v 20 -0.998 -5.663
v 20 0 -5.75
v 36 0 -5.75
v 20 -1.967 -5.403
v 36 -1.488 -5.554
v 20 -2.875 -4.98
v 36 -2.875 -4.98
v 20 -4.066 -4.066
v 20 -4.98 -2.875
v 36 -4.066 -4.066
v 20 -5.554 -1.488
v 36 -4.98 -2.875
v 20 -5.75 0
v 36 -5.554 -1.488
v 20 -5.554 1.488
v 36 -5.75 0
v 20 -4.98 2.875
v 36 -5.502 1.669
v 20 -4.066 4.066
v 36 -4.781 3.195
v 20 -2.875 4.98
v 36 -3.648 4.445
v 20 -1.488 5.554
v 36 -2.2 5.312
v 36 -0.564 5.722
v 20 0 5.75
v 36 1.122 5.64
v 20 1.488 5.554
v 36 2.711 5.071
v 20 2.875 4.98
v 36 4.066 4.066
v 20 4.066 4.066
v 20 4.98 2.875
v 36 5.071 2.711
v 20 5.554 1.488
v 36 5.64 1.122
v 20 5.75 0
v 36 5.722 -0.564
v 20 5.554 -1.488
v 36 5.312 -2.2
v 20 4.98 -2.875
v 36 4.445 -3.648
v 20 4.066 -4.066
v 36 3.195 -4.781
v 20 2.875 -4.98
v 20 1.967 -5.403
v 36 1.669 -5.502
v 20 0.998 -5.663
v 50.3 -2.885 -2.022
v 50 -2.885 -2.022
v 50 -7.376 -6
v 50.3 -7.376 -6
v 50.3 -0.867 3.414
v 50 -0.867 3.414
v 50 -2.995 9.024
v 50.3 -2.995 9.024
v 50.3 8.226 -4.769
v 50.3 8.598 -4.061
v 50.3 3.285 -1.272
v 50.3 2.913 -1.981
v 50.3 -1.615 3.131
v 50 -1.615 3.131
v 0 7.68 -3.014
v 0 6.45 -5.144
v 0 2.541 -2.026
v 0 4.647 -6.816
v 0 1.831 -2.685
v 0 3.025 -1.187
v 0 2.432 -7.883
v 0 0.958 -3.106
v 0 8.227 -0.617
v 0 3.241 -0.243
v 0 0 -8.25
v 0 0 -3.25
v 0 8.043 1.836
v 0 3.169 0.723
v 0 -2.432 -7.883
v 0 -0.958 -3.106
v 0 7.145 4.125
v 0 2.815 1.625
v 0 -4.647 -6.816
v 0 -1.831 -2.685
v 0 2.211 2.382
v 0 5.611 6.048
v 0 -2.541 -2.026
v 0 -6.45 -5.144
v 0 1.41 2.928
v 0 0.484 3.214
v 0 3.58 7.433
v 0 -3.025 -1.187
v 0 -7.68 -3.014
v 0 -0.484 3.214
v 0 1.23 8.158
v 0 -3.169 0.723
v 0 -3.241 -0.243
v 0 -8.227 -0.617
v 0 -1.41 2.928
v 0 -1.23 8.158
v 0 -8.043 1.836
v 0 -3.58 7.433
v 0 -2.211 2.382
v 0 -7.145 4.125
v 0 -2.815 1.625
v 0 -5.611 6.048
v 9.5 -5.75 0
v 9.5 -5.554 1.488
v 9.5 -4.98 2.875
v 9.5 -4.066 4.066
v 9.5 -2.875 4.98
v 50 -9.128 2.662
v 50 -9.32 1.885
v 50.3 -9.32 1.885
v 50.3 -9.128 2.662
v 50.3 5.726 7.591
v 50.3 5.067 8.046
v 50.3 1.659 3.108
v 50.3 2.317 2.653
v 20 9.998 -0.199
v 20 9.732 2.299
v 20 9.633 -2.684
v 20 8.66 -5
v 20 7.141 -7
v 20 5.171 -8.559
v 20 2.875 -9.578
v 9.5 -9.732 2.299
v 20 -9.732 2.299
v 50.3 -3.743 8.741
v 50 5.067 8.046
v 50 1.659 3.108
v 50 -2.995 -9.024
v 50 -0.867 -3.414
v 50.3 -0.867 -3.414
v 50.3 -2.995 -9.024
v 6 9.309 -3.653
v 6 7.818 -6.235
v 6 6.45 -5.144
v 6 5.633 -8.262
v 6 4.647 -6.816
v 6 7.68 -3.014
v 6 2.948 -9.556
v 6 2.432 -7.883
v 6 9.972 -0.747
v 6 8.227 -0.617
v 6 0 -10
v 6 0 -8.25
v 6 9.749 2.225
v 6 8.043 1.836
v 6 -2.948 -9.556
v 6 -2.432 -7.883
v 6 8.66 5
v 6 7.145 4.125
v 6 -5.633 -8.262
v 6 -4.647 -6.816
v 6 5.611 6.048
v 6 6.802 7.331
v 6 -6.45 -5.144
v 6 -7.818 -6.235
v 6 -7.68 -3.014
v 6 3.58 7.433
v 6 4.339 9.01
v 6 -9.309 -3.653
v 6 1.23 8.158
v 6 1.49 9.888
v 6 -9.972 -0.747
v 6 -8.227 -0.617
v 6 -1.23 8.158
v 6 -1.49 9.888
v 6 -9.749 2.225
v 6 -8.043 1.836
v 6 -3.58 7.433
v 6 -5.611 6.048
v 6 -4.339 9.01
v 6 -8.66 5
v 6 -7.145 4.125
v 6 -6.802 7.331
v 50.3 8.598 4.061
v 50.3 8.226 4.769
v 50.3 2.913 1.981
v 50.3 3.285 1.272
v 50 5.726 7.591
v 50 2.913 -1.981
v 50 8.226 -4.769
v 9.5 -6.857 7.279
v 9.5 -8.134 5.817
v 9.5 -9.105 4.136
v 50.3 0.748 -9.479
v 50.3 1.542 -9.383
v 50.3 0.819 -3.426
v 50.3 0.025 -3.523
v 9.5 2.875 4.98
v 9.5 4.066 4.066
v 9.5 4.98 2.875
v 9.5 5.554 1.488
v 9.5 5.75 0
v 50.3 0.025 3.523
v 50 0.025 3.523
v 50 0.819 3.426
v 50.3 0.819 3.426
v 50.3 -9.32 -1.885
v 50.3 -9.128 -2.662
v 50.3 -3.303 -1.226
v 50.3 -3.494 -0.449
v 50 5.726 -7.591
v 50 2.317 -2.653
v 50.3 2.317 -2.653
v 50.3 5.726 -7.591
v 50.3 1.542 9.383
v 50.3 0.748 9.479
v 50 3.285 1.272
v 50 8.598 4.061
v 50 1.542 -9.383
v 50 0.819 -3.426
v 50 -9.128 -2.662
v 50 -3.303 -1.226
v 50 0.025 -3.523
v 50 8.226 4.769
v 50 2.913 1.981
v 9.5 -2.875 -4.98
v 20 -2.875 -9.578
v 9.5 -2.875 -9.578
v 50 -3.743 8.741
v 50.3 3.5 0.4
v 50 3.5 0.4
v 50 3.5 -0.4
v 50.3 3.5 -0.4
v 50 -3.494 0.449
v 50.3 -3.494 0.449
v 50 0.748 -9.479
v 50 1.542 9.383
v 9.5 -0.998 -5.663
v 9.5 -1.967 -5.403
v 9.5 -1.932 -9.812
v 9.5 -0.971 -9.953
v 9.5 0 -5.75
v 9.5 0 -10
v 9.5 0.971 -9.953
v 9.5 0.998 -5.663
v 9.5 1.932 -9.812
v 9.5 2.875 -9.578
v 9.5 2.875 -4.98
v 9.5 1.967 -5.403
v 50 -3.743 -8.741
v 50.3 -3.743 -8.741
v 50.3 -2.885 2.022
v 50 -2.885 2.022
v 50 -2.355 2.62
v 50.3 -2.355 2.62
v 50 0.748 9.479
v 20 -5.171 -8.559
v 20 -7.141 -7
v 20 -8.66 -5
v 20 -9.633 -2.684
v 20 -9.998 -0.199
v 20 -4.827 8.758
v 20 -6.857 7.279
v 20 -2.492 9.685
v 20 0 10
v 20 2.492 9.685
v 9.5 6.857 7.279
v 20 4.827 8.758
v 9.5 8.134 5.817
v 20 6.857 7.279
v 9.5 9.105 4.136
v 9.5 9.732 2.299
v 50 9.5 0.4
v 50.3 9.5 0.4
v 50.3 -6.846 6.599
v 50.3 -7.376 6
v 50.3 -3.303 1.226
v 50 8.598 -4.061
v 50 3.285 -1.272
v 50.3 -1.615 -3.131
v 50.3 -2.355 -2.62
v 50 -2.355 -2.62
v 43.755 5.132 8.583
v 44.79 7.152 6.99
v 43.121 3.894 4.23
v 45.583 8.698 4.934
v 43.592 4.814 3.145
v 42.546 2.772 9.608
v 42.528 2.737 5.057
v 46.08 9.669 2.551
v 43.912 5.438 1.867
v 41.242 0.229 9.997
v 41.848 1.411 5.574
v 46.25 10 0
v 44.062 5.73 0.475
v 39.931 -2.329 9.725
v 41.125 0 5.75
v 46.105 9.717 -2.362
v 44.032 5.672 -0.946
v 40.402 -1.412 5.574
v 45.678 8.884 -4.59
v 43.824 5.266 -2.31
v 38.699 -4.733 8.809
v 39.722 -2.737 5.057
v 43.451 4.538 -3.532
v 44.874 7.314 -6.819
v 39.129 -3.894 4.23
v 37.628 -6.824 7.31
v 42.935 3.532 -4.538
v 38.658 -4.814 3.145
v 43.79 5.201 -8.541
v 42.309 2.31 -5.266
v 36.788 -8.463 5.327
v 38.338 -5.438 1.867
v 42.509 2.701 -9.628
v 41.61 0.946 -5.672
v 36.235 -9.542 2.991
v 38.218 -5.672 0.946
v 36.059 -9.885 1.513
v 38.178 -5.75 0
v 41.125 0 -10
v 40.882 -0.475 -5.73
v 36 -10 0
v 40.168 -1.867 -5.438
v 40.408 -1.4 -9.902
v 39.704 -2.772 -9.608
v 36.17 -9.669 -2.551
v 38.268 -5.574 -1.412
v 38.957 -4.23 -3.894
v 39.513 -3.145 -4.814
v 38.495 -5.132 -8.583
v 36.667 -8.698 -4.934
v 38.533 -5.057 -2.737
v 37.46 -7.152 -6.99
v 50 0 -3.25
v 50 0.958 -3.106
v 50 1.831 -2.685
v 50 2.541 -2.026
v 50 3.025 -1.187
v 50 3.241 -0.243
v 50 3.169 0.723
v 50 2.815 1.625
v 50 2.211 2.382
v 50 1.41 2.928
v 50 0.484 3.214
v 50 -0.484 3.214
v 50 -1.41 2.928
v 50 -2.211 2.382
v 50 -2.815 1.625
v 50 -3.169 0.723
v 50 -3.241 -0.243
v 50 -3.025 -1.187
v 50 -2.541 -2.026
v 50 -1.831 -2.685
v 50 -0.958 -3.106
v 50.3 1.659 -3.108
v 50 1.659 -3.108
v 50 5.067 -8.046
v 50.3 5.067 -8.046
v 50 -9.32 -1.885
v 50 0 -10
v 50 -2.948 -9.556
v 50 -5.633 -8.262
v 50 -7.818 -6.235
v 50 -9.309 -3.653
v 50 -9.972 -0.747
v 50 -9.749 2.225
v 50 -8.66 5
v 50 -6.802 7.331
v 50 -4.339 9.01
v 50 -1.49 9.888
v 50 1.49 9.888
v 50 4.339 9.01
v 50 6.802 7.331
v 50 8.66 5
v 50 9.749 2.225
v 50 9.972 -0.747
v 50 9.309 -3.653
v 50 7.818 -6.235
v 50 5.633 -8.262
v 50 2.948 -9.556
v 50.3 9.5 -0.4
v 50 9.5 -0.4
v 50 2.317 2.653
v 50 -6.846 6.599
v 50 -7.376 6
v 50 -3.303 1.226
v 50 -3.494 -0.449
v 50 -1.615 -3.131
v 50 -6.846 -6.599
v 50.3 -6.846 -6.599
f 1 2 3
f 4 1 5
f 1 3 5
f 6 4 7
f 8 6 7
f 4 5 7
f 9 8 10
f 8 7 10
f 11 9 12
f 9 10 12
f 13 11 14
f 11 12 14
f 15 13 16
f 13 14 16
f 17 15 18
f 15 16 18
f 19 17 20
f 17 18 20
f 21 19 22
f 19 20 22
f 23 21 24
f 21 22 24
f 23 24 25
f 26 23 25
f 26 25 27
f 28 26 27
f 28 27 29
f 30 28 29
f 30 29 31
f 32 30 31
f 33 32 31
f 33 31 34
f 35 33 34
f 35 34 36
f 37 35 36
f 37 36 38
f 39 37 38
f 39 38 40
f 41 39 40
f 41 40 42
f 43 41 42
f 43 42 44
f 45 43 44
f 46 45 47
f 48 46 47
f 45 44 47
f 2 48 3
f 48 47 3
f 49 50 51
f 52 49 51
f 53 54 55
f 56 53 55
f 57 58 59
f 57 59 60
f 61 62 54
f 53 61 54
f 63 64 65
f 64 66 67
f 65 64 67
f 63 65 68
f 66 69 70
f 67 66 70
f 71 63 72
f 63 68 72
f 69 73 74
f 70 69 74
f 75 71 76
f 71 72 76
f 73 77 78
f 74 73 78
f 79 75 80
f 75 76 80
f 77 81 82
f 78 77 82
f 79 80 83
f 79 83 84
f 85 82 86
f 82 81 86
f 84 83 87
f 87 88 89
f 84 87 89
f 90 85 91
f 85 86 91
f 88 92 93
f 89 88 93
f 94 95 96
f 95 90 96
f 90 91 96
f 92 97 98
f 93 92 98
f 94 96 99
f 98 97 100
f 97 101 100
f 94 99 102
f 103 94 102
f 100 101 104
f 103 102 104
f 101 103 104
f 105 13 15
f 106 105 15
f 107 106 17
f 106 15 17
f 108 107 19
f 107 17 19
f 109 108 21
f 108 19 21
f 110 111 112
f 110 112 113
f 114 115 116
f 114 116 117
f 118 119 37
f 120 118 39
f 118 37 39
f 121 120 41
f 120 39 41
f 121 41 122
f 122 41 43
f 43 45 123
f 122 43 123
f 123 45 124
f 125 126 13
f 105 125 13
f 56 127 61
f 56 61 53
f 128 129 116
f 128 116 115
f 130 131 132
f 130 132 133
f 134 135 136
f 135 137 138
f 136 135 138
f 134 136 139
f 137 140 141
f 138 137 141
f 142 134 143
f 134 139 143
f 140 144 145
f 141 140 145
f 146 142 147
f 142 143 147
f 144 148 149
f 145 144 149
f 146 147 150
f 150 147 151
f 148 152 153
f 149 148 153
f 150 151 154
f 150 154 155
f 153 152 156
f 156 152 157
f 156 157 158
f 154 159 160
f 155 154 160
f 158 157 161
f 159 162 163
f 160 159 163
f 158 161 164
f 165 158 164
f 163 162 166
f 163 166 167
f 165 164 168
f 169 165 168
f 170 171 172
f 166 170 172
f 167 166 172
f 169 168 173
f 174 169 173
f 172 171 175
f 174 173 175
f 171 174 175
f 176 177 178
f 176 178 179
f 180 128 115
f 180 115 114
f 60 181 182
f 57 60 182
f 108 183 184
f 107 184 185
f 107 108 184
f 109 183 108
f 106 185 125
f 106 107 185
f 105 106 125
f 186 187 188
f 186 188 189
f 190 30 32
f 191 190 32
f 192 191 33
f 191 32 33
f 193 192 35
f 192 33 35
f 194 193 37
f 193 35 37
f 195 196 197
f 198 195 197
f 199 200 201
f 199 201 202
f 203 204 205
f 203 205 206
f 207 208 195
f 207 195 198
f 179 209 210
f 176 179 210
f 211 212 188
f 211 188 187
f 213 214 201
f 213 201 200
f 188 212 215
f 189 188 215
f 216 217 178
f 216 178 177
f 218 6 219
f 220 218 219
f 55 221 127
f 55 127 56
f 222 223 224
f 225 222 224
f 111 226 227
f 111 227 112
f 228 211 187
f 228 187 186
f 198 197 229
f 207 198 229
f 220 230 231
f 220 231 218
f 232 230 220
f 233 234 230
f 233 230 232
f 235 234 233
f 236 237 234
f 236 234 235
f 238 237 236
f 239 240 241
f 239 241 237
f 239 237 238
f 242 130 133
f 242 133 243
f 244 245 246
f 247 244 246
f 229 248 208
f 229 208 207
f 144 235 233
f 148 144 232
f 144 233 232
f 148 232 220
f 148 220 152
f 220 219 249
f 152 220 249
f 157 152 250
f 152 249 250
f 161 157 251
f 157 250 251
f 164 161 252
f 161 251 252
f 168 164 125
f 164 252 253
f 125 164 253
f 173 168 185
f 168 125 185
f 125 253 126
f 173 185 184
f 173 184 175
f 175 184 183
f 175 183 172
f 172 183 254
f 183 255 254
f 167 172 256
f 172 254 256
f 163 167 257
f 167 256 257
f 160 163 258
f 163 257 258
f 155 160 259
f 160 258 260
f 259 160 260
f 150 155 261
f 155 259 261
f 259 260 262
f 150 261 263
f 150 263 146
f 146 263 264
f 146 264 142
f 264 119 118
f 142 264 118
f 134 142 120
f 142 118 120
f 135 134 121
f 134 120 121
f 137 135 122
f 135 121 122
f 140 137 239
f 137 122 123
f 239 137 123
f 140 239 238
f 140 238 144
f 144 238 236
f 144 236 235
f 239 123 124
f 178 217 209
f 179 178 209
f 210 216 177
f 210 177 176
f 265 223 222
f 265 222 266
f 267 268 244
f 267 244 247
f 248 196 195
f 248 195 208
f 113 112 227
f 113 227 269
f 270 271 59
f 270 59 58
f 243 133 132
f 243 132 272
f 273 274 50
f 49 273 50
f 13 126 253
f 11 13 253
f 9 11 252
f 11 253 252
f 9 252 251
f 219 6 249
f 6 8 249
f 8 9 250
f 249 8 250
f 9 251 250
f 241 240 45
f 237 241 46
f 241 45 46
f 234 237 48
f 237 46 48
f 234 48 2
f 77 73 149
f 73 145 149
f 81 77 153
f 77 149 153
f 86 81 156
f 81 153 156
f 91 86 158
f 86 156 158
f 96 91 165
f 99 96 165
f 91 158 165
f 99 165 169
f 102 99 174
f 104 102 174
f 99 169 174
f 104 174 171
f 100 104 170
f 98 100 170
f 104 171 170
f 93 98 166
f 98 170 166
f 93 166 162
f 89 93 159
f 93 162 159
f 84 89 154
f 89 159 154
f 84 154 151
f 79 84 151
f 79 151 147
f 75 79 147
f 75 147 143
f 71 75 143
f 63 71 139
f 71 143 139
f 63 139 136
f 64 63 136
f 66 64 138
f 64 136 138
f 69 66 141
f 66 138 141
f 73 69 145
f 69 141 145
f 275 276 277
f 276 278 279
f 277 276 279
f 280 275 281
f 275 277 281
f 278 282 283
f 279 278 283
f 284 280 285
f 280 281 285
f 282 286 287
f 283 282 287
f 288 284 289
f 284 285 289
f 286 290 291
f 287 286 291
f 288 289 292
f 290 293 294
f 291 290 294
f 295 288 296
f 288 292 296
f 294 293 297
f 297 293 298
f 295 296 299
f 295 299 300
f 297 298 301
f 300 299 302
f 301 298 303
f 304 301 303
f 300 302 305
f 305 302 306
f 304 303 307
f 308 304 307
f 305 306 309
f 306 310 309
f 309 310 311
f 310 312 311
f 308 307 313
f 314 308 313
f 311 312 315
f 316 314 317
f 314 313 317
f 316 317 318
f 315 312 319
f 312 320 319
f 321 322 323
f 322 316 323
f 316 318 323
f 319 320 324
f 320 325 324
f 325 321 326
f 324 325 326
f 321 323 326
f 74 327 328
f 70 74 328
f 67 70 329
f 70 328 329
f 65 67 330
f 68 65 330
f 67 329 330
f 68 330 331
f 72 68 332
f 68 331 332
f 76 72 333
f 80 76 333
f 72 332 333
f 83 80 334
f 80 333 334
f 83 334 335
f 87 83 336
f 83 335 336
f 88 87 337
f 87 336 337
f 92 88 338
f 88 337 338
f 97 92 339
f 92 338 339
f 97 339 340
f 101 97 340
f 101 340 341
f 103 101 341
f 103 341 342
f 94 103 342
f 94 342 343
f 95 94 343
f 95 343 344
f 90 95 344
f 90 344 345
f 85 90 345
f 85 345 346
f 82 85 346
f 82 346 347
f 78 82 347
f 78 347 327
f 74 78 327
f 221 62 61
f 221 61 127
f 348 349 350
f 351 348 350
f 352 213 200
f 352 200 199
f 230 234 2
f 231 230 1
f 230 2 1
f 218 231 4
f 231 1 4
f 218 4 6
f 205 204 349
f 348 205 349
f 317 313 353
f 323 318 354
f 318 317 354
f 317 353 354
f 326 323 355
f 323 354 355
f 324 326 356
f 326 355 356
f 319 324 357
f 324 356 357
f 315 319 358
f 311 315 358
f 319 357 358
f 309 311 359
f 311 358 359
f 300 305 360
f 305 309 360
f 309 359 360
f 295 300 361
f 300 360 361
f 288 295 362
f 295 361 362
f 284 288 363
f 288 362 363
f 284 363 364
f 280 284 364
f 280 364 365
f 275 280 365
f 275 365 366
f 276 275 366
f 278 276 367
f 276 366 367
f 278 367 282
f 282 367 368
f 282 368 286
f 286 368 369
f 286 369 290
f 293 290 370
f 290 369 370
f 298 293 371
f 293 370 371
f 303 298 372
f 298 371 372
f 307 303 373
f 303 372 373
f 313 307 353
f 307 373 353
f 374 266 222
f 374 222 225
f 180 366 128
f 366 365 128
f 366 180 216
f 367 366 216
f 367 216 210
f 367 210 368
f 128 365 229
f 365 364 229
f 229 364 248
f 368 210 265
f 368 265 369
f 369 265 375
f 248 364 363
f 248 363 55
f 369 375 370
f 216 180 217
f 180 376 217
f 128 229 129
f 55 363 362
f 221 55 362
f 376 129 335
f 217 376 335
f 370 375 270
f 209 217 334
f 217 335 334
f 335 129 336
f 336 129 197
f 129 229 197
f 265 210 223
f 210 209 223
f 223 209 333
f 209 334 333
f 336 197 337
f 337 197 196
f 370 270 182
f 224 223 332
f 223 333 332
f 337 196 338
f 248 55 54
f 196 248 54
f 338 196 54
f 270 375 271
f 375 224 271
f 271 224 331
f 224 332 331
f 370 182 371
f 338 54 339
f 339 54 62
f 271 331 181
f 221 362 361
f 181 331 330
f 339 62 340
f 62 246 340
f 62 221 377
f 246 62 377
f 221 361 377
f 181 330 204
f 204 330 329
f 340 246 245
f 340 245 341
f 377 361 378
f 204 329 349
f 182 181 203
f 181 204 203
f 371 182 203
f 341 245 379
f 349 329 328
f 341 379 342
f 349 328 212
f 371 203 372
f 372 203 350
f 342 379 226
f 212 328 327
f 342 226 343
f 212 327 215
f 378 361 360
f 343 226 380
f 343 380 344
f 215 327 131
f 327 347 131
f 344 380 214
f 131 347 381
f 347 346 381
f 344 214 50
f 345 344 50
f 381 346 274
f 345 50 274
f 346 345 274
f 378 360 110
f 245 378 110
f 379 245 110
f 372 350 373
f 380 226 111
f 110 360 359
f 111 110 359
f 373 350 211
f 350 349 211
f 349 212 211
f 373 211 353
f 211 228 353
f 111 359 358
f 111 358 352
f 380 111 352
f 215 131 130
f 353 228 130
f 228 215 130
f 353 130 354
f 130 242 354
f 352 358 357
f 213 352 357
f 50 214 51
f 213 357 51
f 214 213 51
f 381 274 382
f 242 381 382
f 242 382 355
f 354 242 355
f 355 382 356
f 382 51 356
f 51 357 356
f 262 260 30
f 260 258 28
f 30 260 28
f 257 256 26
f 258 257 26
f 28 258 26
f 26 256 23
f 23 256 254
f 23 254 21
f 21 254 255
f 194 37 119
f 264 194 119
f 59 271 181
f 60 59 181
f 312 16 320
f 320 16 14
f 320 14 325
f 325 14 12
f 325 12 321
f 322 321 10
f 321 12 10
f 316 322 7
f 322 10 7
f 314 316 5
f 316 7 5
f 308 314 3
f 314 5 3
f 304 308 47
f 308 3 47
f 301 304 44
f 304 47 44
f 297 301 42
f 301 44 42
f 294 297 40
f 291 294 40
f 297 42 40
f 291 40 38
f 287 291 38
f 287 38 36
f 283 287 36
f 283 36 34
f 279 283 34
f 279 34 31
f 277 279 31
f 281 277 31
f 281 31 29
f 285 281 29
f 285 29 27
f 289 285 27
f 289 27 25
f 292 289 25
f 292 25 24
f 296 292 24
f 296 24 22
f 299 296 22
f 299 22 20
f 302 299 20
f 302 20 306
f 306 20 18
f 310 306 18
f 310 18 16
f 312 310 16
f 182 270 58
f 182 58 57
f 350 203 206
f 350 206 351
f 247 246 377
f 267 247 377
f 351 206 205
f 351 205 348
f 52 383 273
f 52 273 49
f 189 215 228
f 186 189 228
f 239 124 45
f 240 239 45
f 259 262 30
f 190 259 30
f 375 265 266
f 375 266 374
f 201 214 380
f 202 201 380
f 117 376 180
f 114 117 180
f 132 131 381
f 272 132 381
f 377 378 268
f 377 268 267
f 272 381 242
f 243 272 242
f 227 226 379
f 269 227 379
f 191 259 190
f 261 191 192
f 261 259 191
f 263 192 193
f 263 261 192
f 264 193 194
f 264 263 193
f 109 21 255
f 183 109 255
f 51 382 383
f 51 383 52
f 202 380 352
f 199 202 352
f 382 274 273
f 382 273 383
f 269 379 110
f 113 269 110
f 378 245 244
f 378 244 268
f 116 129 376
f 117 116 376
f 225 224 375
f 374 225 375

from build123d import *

# Parameters (mm, degrees)
CUT_EXTRUDE_1_DEPTH      = 10.5
CUT_EXTRUDE_2_DEPTH      = 52.961524227
CUT_EXTRUDE_2_DEPTH_BACK = 52.961524227
EXTRUDE_1_REACH          = 40.678
SKETCH_4_R               = 5.75
SKETCH_5_R               = 3.25
CUT_EXTRUDE_3_DEPTH      = 52.961524227
SKETCH_6_W               = 0.8
SKETCH_6_H               = 6
EXTRUDE_2_DEPTH          = 0.3
PATTERN_CIRCULAR_1_COUNT = 13


with BuildPart() as part:
    # 草图1 → 旋转1 (revolve)
    with BuildSketch(Plane.XY):
        Polygon((36, 0), (0, 0), (0, -8.25), (6, -8.25), (6, -10), (20, -10), (20, -5.75), (36, -5.75), align=None)
    revolve(axis=Axis((50, 0, 0), (-1, 0, 0)))

    # 草图2 → 切除-拉伸1 (cut)
    with BuildSketch(Plane(origin=(20, 0, 0), x_dir=(0, 0, -1), z_dir=(1, 0, 0))):
        with BuildLine():
            ThreePointArc((4.979646072, 2.875), (5.75, 0), (4.979646072, -2.875))
            Line((4.979646072, -2.875), (9.577806377, -2.875))
            ThreePointArc((9.577806377, -2.875), (10, 0), (9.577806377, 2.875))
            Line((9.577806377, 2.875), (4.979646072, 2.875))
        make_face()
        with BuildLine():
            ThreePointArc((-4.979646072, 2.875), (-2.875, 4.979646072), (0, 5.75))
            Line((0, 5.75), (-2.299080153, 9.732123635))
            ThreePointArc((-2.299080153, 9.732123635), (-5, 8.660254038), (-7.278726225, 6.857123635))
            Line((-7.278726225, 6.857123635), (-4.979646072, 2.875))
        make_face()
        with BuildLine():
            Line((-2.299080153, -9.732123635), (0, -5.75))
            ThreePointArc((0, -5.75), (-2.875, -4.979646072), (-4.979646072, -2.875))
            Line((-4.979646072, -2.875), (-7.278726225, -6.857123635))
            ThreePointArc((-7.278726225, -6.857123635), (-5, -8.660254038), (-2.299080153, -9.732123635))
        make_face()
    extrude(amount=-CUT_EXTRUDE_1_DEPTH, mode=Mode.SUBTRACT)


with BuildPart() as body_2:
    # 草图1<3> → 旋转2 (revolve)
    with BuildSketch(Plane.XY):
        Polygon((50, 0), (36, 0), (36, -5.75), (36, -10), (50, -10), align=None)
    revolve(axis=Axis((50, 0, 0), (-1, 0, 0)))

    # 草图3 → 切除-拉伸2 (cut, two sides: drawn at the far end of the back side and taken through both)
    with BuildSketch(Plane.XY.offset(-CUT_EXTRUDE_2_DEPTH_BACK)):
        Polygon((36, -10), (36, 10), (46.25, 10), align=None)
    extrude(amount=CUT_EXTRUDE_2_DEPTH + CUT_EXTRUDE_2_DEPTH_BACK, mode=Mode.SUBTRACT)

    # 草图4 → 凸台-拉伸1 (add, up to next)
    with BuildSketch(Plane(origin=(36, 0, 0), x_dir=(0, 0, -1), z_dir=(1, 0, 0)), mode=Mode.PRIVATE) as extrude_1_sk1:
        Circle(SKETCH_4_R)
    extrude_1_tool1 = extrude(extrude_1_sk1.sketch, amount=EXTRUDE_1_REACH, mode=Mode.PRIVATE) - body_2.part

    add(part.part)  # 凸台-拉伸1 merges part
    add(extrude_1_tool1.solids().sort_by_distance((36, 0, 0))[0])

    # 草图5 → 切除-拉伸3 (cut, through all)
    with BuildSketch(Plane(origin=(50, 0, 0), x_dir=(0, 0, -1), z_dir=(1, 0, 0))):
        Circle(SKETCH_5_R)
    extrude(amount=-CUT_EXTRUDE_3_DEPTH, mode=Mode.SUBTRACT)

    # 草图6 → 凸台-拉伸2 (add)
    with BuildSketch(Plane(origin=(50, 0, 0), x_dir=(0, 0, -1), z_dir=(1, 0, 0))):
        with Locations((0, 6.5)):
            Rectangle(SKETCH_6_W, SKETCH_6_H)
    extrude_2 = extrude(amount=EXTRUDE_2_DEPTH)

    # 阵列(圆周)1: 凸台-拉伸2 ×13 about axis
    pattern_circular_1_axis = Axis((0, 0, 0), (1, 0, 0))
    for i in range(1, PATTERN_CIRCULAR_1_COUNT):
        add(extrude_2.rotate(pattern_circular_1_axis, i * 360 / PATTERN_CIRCULAR_1_COUNT))


solid = body_2.part
